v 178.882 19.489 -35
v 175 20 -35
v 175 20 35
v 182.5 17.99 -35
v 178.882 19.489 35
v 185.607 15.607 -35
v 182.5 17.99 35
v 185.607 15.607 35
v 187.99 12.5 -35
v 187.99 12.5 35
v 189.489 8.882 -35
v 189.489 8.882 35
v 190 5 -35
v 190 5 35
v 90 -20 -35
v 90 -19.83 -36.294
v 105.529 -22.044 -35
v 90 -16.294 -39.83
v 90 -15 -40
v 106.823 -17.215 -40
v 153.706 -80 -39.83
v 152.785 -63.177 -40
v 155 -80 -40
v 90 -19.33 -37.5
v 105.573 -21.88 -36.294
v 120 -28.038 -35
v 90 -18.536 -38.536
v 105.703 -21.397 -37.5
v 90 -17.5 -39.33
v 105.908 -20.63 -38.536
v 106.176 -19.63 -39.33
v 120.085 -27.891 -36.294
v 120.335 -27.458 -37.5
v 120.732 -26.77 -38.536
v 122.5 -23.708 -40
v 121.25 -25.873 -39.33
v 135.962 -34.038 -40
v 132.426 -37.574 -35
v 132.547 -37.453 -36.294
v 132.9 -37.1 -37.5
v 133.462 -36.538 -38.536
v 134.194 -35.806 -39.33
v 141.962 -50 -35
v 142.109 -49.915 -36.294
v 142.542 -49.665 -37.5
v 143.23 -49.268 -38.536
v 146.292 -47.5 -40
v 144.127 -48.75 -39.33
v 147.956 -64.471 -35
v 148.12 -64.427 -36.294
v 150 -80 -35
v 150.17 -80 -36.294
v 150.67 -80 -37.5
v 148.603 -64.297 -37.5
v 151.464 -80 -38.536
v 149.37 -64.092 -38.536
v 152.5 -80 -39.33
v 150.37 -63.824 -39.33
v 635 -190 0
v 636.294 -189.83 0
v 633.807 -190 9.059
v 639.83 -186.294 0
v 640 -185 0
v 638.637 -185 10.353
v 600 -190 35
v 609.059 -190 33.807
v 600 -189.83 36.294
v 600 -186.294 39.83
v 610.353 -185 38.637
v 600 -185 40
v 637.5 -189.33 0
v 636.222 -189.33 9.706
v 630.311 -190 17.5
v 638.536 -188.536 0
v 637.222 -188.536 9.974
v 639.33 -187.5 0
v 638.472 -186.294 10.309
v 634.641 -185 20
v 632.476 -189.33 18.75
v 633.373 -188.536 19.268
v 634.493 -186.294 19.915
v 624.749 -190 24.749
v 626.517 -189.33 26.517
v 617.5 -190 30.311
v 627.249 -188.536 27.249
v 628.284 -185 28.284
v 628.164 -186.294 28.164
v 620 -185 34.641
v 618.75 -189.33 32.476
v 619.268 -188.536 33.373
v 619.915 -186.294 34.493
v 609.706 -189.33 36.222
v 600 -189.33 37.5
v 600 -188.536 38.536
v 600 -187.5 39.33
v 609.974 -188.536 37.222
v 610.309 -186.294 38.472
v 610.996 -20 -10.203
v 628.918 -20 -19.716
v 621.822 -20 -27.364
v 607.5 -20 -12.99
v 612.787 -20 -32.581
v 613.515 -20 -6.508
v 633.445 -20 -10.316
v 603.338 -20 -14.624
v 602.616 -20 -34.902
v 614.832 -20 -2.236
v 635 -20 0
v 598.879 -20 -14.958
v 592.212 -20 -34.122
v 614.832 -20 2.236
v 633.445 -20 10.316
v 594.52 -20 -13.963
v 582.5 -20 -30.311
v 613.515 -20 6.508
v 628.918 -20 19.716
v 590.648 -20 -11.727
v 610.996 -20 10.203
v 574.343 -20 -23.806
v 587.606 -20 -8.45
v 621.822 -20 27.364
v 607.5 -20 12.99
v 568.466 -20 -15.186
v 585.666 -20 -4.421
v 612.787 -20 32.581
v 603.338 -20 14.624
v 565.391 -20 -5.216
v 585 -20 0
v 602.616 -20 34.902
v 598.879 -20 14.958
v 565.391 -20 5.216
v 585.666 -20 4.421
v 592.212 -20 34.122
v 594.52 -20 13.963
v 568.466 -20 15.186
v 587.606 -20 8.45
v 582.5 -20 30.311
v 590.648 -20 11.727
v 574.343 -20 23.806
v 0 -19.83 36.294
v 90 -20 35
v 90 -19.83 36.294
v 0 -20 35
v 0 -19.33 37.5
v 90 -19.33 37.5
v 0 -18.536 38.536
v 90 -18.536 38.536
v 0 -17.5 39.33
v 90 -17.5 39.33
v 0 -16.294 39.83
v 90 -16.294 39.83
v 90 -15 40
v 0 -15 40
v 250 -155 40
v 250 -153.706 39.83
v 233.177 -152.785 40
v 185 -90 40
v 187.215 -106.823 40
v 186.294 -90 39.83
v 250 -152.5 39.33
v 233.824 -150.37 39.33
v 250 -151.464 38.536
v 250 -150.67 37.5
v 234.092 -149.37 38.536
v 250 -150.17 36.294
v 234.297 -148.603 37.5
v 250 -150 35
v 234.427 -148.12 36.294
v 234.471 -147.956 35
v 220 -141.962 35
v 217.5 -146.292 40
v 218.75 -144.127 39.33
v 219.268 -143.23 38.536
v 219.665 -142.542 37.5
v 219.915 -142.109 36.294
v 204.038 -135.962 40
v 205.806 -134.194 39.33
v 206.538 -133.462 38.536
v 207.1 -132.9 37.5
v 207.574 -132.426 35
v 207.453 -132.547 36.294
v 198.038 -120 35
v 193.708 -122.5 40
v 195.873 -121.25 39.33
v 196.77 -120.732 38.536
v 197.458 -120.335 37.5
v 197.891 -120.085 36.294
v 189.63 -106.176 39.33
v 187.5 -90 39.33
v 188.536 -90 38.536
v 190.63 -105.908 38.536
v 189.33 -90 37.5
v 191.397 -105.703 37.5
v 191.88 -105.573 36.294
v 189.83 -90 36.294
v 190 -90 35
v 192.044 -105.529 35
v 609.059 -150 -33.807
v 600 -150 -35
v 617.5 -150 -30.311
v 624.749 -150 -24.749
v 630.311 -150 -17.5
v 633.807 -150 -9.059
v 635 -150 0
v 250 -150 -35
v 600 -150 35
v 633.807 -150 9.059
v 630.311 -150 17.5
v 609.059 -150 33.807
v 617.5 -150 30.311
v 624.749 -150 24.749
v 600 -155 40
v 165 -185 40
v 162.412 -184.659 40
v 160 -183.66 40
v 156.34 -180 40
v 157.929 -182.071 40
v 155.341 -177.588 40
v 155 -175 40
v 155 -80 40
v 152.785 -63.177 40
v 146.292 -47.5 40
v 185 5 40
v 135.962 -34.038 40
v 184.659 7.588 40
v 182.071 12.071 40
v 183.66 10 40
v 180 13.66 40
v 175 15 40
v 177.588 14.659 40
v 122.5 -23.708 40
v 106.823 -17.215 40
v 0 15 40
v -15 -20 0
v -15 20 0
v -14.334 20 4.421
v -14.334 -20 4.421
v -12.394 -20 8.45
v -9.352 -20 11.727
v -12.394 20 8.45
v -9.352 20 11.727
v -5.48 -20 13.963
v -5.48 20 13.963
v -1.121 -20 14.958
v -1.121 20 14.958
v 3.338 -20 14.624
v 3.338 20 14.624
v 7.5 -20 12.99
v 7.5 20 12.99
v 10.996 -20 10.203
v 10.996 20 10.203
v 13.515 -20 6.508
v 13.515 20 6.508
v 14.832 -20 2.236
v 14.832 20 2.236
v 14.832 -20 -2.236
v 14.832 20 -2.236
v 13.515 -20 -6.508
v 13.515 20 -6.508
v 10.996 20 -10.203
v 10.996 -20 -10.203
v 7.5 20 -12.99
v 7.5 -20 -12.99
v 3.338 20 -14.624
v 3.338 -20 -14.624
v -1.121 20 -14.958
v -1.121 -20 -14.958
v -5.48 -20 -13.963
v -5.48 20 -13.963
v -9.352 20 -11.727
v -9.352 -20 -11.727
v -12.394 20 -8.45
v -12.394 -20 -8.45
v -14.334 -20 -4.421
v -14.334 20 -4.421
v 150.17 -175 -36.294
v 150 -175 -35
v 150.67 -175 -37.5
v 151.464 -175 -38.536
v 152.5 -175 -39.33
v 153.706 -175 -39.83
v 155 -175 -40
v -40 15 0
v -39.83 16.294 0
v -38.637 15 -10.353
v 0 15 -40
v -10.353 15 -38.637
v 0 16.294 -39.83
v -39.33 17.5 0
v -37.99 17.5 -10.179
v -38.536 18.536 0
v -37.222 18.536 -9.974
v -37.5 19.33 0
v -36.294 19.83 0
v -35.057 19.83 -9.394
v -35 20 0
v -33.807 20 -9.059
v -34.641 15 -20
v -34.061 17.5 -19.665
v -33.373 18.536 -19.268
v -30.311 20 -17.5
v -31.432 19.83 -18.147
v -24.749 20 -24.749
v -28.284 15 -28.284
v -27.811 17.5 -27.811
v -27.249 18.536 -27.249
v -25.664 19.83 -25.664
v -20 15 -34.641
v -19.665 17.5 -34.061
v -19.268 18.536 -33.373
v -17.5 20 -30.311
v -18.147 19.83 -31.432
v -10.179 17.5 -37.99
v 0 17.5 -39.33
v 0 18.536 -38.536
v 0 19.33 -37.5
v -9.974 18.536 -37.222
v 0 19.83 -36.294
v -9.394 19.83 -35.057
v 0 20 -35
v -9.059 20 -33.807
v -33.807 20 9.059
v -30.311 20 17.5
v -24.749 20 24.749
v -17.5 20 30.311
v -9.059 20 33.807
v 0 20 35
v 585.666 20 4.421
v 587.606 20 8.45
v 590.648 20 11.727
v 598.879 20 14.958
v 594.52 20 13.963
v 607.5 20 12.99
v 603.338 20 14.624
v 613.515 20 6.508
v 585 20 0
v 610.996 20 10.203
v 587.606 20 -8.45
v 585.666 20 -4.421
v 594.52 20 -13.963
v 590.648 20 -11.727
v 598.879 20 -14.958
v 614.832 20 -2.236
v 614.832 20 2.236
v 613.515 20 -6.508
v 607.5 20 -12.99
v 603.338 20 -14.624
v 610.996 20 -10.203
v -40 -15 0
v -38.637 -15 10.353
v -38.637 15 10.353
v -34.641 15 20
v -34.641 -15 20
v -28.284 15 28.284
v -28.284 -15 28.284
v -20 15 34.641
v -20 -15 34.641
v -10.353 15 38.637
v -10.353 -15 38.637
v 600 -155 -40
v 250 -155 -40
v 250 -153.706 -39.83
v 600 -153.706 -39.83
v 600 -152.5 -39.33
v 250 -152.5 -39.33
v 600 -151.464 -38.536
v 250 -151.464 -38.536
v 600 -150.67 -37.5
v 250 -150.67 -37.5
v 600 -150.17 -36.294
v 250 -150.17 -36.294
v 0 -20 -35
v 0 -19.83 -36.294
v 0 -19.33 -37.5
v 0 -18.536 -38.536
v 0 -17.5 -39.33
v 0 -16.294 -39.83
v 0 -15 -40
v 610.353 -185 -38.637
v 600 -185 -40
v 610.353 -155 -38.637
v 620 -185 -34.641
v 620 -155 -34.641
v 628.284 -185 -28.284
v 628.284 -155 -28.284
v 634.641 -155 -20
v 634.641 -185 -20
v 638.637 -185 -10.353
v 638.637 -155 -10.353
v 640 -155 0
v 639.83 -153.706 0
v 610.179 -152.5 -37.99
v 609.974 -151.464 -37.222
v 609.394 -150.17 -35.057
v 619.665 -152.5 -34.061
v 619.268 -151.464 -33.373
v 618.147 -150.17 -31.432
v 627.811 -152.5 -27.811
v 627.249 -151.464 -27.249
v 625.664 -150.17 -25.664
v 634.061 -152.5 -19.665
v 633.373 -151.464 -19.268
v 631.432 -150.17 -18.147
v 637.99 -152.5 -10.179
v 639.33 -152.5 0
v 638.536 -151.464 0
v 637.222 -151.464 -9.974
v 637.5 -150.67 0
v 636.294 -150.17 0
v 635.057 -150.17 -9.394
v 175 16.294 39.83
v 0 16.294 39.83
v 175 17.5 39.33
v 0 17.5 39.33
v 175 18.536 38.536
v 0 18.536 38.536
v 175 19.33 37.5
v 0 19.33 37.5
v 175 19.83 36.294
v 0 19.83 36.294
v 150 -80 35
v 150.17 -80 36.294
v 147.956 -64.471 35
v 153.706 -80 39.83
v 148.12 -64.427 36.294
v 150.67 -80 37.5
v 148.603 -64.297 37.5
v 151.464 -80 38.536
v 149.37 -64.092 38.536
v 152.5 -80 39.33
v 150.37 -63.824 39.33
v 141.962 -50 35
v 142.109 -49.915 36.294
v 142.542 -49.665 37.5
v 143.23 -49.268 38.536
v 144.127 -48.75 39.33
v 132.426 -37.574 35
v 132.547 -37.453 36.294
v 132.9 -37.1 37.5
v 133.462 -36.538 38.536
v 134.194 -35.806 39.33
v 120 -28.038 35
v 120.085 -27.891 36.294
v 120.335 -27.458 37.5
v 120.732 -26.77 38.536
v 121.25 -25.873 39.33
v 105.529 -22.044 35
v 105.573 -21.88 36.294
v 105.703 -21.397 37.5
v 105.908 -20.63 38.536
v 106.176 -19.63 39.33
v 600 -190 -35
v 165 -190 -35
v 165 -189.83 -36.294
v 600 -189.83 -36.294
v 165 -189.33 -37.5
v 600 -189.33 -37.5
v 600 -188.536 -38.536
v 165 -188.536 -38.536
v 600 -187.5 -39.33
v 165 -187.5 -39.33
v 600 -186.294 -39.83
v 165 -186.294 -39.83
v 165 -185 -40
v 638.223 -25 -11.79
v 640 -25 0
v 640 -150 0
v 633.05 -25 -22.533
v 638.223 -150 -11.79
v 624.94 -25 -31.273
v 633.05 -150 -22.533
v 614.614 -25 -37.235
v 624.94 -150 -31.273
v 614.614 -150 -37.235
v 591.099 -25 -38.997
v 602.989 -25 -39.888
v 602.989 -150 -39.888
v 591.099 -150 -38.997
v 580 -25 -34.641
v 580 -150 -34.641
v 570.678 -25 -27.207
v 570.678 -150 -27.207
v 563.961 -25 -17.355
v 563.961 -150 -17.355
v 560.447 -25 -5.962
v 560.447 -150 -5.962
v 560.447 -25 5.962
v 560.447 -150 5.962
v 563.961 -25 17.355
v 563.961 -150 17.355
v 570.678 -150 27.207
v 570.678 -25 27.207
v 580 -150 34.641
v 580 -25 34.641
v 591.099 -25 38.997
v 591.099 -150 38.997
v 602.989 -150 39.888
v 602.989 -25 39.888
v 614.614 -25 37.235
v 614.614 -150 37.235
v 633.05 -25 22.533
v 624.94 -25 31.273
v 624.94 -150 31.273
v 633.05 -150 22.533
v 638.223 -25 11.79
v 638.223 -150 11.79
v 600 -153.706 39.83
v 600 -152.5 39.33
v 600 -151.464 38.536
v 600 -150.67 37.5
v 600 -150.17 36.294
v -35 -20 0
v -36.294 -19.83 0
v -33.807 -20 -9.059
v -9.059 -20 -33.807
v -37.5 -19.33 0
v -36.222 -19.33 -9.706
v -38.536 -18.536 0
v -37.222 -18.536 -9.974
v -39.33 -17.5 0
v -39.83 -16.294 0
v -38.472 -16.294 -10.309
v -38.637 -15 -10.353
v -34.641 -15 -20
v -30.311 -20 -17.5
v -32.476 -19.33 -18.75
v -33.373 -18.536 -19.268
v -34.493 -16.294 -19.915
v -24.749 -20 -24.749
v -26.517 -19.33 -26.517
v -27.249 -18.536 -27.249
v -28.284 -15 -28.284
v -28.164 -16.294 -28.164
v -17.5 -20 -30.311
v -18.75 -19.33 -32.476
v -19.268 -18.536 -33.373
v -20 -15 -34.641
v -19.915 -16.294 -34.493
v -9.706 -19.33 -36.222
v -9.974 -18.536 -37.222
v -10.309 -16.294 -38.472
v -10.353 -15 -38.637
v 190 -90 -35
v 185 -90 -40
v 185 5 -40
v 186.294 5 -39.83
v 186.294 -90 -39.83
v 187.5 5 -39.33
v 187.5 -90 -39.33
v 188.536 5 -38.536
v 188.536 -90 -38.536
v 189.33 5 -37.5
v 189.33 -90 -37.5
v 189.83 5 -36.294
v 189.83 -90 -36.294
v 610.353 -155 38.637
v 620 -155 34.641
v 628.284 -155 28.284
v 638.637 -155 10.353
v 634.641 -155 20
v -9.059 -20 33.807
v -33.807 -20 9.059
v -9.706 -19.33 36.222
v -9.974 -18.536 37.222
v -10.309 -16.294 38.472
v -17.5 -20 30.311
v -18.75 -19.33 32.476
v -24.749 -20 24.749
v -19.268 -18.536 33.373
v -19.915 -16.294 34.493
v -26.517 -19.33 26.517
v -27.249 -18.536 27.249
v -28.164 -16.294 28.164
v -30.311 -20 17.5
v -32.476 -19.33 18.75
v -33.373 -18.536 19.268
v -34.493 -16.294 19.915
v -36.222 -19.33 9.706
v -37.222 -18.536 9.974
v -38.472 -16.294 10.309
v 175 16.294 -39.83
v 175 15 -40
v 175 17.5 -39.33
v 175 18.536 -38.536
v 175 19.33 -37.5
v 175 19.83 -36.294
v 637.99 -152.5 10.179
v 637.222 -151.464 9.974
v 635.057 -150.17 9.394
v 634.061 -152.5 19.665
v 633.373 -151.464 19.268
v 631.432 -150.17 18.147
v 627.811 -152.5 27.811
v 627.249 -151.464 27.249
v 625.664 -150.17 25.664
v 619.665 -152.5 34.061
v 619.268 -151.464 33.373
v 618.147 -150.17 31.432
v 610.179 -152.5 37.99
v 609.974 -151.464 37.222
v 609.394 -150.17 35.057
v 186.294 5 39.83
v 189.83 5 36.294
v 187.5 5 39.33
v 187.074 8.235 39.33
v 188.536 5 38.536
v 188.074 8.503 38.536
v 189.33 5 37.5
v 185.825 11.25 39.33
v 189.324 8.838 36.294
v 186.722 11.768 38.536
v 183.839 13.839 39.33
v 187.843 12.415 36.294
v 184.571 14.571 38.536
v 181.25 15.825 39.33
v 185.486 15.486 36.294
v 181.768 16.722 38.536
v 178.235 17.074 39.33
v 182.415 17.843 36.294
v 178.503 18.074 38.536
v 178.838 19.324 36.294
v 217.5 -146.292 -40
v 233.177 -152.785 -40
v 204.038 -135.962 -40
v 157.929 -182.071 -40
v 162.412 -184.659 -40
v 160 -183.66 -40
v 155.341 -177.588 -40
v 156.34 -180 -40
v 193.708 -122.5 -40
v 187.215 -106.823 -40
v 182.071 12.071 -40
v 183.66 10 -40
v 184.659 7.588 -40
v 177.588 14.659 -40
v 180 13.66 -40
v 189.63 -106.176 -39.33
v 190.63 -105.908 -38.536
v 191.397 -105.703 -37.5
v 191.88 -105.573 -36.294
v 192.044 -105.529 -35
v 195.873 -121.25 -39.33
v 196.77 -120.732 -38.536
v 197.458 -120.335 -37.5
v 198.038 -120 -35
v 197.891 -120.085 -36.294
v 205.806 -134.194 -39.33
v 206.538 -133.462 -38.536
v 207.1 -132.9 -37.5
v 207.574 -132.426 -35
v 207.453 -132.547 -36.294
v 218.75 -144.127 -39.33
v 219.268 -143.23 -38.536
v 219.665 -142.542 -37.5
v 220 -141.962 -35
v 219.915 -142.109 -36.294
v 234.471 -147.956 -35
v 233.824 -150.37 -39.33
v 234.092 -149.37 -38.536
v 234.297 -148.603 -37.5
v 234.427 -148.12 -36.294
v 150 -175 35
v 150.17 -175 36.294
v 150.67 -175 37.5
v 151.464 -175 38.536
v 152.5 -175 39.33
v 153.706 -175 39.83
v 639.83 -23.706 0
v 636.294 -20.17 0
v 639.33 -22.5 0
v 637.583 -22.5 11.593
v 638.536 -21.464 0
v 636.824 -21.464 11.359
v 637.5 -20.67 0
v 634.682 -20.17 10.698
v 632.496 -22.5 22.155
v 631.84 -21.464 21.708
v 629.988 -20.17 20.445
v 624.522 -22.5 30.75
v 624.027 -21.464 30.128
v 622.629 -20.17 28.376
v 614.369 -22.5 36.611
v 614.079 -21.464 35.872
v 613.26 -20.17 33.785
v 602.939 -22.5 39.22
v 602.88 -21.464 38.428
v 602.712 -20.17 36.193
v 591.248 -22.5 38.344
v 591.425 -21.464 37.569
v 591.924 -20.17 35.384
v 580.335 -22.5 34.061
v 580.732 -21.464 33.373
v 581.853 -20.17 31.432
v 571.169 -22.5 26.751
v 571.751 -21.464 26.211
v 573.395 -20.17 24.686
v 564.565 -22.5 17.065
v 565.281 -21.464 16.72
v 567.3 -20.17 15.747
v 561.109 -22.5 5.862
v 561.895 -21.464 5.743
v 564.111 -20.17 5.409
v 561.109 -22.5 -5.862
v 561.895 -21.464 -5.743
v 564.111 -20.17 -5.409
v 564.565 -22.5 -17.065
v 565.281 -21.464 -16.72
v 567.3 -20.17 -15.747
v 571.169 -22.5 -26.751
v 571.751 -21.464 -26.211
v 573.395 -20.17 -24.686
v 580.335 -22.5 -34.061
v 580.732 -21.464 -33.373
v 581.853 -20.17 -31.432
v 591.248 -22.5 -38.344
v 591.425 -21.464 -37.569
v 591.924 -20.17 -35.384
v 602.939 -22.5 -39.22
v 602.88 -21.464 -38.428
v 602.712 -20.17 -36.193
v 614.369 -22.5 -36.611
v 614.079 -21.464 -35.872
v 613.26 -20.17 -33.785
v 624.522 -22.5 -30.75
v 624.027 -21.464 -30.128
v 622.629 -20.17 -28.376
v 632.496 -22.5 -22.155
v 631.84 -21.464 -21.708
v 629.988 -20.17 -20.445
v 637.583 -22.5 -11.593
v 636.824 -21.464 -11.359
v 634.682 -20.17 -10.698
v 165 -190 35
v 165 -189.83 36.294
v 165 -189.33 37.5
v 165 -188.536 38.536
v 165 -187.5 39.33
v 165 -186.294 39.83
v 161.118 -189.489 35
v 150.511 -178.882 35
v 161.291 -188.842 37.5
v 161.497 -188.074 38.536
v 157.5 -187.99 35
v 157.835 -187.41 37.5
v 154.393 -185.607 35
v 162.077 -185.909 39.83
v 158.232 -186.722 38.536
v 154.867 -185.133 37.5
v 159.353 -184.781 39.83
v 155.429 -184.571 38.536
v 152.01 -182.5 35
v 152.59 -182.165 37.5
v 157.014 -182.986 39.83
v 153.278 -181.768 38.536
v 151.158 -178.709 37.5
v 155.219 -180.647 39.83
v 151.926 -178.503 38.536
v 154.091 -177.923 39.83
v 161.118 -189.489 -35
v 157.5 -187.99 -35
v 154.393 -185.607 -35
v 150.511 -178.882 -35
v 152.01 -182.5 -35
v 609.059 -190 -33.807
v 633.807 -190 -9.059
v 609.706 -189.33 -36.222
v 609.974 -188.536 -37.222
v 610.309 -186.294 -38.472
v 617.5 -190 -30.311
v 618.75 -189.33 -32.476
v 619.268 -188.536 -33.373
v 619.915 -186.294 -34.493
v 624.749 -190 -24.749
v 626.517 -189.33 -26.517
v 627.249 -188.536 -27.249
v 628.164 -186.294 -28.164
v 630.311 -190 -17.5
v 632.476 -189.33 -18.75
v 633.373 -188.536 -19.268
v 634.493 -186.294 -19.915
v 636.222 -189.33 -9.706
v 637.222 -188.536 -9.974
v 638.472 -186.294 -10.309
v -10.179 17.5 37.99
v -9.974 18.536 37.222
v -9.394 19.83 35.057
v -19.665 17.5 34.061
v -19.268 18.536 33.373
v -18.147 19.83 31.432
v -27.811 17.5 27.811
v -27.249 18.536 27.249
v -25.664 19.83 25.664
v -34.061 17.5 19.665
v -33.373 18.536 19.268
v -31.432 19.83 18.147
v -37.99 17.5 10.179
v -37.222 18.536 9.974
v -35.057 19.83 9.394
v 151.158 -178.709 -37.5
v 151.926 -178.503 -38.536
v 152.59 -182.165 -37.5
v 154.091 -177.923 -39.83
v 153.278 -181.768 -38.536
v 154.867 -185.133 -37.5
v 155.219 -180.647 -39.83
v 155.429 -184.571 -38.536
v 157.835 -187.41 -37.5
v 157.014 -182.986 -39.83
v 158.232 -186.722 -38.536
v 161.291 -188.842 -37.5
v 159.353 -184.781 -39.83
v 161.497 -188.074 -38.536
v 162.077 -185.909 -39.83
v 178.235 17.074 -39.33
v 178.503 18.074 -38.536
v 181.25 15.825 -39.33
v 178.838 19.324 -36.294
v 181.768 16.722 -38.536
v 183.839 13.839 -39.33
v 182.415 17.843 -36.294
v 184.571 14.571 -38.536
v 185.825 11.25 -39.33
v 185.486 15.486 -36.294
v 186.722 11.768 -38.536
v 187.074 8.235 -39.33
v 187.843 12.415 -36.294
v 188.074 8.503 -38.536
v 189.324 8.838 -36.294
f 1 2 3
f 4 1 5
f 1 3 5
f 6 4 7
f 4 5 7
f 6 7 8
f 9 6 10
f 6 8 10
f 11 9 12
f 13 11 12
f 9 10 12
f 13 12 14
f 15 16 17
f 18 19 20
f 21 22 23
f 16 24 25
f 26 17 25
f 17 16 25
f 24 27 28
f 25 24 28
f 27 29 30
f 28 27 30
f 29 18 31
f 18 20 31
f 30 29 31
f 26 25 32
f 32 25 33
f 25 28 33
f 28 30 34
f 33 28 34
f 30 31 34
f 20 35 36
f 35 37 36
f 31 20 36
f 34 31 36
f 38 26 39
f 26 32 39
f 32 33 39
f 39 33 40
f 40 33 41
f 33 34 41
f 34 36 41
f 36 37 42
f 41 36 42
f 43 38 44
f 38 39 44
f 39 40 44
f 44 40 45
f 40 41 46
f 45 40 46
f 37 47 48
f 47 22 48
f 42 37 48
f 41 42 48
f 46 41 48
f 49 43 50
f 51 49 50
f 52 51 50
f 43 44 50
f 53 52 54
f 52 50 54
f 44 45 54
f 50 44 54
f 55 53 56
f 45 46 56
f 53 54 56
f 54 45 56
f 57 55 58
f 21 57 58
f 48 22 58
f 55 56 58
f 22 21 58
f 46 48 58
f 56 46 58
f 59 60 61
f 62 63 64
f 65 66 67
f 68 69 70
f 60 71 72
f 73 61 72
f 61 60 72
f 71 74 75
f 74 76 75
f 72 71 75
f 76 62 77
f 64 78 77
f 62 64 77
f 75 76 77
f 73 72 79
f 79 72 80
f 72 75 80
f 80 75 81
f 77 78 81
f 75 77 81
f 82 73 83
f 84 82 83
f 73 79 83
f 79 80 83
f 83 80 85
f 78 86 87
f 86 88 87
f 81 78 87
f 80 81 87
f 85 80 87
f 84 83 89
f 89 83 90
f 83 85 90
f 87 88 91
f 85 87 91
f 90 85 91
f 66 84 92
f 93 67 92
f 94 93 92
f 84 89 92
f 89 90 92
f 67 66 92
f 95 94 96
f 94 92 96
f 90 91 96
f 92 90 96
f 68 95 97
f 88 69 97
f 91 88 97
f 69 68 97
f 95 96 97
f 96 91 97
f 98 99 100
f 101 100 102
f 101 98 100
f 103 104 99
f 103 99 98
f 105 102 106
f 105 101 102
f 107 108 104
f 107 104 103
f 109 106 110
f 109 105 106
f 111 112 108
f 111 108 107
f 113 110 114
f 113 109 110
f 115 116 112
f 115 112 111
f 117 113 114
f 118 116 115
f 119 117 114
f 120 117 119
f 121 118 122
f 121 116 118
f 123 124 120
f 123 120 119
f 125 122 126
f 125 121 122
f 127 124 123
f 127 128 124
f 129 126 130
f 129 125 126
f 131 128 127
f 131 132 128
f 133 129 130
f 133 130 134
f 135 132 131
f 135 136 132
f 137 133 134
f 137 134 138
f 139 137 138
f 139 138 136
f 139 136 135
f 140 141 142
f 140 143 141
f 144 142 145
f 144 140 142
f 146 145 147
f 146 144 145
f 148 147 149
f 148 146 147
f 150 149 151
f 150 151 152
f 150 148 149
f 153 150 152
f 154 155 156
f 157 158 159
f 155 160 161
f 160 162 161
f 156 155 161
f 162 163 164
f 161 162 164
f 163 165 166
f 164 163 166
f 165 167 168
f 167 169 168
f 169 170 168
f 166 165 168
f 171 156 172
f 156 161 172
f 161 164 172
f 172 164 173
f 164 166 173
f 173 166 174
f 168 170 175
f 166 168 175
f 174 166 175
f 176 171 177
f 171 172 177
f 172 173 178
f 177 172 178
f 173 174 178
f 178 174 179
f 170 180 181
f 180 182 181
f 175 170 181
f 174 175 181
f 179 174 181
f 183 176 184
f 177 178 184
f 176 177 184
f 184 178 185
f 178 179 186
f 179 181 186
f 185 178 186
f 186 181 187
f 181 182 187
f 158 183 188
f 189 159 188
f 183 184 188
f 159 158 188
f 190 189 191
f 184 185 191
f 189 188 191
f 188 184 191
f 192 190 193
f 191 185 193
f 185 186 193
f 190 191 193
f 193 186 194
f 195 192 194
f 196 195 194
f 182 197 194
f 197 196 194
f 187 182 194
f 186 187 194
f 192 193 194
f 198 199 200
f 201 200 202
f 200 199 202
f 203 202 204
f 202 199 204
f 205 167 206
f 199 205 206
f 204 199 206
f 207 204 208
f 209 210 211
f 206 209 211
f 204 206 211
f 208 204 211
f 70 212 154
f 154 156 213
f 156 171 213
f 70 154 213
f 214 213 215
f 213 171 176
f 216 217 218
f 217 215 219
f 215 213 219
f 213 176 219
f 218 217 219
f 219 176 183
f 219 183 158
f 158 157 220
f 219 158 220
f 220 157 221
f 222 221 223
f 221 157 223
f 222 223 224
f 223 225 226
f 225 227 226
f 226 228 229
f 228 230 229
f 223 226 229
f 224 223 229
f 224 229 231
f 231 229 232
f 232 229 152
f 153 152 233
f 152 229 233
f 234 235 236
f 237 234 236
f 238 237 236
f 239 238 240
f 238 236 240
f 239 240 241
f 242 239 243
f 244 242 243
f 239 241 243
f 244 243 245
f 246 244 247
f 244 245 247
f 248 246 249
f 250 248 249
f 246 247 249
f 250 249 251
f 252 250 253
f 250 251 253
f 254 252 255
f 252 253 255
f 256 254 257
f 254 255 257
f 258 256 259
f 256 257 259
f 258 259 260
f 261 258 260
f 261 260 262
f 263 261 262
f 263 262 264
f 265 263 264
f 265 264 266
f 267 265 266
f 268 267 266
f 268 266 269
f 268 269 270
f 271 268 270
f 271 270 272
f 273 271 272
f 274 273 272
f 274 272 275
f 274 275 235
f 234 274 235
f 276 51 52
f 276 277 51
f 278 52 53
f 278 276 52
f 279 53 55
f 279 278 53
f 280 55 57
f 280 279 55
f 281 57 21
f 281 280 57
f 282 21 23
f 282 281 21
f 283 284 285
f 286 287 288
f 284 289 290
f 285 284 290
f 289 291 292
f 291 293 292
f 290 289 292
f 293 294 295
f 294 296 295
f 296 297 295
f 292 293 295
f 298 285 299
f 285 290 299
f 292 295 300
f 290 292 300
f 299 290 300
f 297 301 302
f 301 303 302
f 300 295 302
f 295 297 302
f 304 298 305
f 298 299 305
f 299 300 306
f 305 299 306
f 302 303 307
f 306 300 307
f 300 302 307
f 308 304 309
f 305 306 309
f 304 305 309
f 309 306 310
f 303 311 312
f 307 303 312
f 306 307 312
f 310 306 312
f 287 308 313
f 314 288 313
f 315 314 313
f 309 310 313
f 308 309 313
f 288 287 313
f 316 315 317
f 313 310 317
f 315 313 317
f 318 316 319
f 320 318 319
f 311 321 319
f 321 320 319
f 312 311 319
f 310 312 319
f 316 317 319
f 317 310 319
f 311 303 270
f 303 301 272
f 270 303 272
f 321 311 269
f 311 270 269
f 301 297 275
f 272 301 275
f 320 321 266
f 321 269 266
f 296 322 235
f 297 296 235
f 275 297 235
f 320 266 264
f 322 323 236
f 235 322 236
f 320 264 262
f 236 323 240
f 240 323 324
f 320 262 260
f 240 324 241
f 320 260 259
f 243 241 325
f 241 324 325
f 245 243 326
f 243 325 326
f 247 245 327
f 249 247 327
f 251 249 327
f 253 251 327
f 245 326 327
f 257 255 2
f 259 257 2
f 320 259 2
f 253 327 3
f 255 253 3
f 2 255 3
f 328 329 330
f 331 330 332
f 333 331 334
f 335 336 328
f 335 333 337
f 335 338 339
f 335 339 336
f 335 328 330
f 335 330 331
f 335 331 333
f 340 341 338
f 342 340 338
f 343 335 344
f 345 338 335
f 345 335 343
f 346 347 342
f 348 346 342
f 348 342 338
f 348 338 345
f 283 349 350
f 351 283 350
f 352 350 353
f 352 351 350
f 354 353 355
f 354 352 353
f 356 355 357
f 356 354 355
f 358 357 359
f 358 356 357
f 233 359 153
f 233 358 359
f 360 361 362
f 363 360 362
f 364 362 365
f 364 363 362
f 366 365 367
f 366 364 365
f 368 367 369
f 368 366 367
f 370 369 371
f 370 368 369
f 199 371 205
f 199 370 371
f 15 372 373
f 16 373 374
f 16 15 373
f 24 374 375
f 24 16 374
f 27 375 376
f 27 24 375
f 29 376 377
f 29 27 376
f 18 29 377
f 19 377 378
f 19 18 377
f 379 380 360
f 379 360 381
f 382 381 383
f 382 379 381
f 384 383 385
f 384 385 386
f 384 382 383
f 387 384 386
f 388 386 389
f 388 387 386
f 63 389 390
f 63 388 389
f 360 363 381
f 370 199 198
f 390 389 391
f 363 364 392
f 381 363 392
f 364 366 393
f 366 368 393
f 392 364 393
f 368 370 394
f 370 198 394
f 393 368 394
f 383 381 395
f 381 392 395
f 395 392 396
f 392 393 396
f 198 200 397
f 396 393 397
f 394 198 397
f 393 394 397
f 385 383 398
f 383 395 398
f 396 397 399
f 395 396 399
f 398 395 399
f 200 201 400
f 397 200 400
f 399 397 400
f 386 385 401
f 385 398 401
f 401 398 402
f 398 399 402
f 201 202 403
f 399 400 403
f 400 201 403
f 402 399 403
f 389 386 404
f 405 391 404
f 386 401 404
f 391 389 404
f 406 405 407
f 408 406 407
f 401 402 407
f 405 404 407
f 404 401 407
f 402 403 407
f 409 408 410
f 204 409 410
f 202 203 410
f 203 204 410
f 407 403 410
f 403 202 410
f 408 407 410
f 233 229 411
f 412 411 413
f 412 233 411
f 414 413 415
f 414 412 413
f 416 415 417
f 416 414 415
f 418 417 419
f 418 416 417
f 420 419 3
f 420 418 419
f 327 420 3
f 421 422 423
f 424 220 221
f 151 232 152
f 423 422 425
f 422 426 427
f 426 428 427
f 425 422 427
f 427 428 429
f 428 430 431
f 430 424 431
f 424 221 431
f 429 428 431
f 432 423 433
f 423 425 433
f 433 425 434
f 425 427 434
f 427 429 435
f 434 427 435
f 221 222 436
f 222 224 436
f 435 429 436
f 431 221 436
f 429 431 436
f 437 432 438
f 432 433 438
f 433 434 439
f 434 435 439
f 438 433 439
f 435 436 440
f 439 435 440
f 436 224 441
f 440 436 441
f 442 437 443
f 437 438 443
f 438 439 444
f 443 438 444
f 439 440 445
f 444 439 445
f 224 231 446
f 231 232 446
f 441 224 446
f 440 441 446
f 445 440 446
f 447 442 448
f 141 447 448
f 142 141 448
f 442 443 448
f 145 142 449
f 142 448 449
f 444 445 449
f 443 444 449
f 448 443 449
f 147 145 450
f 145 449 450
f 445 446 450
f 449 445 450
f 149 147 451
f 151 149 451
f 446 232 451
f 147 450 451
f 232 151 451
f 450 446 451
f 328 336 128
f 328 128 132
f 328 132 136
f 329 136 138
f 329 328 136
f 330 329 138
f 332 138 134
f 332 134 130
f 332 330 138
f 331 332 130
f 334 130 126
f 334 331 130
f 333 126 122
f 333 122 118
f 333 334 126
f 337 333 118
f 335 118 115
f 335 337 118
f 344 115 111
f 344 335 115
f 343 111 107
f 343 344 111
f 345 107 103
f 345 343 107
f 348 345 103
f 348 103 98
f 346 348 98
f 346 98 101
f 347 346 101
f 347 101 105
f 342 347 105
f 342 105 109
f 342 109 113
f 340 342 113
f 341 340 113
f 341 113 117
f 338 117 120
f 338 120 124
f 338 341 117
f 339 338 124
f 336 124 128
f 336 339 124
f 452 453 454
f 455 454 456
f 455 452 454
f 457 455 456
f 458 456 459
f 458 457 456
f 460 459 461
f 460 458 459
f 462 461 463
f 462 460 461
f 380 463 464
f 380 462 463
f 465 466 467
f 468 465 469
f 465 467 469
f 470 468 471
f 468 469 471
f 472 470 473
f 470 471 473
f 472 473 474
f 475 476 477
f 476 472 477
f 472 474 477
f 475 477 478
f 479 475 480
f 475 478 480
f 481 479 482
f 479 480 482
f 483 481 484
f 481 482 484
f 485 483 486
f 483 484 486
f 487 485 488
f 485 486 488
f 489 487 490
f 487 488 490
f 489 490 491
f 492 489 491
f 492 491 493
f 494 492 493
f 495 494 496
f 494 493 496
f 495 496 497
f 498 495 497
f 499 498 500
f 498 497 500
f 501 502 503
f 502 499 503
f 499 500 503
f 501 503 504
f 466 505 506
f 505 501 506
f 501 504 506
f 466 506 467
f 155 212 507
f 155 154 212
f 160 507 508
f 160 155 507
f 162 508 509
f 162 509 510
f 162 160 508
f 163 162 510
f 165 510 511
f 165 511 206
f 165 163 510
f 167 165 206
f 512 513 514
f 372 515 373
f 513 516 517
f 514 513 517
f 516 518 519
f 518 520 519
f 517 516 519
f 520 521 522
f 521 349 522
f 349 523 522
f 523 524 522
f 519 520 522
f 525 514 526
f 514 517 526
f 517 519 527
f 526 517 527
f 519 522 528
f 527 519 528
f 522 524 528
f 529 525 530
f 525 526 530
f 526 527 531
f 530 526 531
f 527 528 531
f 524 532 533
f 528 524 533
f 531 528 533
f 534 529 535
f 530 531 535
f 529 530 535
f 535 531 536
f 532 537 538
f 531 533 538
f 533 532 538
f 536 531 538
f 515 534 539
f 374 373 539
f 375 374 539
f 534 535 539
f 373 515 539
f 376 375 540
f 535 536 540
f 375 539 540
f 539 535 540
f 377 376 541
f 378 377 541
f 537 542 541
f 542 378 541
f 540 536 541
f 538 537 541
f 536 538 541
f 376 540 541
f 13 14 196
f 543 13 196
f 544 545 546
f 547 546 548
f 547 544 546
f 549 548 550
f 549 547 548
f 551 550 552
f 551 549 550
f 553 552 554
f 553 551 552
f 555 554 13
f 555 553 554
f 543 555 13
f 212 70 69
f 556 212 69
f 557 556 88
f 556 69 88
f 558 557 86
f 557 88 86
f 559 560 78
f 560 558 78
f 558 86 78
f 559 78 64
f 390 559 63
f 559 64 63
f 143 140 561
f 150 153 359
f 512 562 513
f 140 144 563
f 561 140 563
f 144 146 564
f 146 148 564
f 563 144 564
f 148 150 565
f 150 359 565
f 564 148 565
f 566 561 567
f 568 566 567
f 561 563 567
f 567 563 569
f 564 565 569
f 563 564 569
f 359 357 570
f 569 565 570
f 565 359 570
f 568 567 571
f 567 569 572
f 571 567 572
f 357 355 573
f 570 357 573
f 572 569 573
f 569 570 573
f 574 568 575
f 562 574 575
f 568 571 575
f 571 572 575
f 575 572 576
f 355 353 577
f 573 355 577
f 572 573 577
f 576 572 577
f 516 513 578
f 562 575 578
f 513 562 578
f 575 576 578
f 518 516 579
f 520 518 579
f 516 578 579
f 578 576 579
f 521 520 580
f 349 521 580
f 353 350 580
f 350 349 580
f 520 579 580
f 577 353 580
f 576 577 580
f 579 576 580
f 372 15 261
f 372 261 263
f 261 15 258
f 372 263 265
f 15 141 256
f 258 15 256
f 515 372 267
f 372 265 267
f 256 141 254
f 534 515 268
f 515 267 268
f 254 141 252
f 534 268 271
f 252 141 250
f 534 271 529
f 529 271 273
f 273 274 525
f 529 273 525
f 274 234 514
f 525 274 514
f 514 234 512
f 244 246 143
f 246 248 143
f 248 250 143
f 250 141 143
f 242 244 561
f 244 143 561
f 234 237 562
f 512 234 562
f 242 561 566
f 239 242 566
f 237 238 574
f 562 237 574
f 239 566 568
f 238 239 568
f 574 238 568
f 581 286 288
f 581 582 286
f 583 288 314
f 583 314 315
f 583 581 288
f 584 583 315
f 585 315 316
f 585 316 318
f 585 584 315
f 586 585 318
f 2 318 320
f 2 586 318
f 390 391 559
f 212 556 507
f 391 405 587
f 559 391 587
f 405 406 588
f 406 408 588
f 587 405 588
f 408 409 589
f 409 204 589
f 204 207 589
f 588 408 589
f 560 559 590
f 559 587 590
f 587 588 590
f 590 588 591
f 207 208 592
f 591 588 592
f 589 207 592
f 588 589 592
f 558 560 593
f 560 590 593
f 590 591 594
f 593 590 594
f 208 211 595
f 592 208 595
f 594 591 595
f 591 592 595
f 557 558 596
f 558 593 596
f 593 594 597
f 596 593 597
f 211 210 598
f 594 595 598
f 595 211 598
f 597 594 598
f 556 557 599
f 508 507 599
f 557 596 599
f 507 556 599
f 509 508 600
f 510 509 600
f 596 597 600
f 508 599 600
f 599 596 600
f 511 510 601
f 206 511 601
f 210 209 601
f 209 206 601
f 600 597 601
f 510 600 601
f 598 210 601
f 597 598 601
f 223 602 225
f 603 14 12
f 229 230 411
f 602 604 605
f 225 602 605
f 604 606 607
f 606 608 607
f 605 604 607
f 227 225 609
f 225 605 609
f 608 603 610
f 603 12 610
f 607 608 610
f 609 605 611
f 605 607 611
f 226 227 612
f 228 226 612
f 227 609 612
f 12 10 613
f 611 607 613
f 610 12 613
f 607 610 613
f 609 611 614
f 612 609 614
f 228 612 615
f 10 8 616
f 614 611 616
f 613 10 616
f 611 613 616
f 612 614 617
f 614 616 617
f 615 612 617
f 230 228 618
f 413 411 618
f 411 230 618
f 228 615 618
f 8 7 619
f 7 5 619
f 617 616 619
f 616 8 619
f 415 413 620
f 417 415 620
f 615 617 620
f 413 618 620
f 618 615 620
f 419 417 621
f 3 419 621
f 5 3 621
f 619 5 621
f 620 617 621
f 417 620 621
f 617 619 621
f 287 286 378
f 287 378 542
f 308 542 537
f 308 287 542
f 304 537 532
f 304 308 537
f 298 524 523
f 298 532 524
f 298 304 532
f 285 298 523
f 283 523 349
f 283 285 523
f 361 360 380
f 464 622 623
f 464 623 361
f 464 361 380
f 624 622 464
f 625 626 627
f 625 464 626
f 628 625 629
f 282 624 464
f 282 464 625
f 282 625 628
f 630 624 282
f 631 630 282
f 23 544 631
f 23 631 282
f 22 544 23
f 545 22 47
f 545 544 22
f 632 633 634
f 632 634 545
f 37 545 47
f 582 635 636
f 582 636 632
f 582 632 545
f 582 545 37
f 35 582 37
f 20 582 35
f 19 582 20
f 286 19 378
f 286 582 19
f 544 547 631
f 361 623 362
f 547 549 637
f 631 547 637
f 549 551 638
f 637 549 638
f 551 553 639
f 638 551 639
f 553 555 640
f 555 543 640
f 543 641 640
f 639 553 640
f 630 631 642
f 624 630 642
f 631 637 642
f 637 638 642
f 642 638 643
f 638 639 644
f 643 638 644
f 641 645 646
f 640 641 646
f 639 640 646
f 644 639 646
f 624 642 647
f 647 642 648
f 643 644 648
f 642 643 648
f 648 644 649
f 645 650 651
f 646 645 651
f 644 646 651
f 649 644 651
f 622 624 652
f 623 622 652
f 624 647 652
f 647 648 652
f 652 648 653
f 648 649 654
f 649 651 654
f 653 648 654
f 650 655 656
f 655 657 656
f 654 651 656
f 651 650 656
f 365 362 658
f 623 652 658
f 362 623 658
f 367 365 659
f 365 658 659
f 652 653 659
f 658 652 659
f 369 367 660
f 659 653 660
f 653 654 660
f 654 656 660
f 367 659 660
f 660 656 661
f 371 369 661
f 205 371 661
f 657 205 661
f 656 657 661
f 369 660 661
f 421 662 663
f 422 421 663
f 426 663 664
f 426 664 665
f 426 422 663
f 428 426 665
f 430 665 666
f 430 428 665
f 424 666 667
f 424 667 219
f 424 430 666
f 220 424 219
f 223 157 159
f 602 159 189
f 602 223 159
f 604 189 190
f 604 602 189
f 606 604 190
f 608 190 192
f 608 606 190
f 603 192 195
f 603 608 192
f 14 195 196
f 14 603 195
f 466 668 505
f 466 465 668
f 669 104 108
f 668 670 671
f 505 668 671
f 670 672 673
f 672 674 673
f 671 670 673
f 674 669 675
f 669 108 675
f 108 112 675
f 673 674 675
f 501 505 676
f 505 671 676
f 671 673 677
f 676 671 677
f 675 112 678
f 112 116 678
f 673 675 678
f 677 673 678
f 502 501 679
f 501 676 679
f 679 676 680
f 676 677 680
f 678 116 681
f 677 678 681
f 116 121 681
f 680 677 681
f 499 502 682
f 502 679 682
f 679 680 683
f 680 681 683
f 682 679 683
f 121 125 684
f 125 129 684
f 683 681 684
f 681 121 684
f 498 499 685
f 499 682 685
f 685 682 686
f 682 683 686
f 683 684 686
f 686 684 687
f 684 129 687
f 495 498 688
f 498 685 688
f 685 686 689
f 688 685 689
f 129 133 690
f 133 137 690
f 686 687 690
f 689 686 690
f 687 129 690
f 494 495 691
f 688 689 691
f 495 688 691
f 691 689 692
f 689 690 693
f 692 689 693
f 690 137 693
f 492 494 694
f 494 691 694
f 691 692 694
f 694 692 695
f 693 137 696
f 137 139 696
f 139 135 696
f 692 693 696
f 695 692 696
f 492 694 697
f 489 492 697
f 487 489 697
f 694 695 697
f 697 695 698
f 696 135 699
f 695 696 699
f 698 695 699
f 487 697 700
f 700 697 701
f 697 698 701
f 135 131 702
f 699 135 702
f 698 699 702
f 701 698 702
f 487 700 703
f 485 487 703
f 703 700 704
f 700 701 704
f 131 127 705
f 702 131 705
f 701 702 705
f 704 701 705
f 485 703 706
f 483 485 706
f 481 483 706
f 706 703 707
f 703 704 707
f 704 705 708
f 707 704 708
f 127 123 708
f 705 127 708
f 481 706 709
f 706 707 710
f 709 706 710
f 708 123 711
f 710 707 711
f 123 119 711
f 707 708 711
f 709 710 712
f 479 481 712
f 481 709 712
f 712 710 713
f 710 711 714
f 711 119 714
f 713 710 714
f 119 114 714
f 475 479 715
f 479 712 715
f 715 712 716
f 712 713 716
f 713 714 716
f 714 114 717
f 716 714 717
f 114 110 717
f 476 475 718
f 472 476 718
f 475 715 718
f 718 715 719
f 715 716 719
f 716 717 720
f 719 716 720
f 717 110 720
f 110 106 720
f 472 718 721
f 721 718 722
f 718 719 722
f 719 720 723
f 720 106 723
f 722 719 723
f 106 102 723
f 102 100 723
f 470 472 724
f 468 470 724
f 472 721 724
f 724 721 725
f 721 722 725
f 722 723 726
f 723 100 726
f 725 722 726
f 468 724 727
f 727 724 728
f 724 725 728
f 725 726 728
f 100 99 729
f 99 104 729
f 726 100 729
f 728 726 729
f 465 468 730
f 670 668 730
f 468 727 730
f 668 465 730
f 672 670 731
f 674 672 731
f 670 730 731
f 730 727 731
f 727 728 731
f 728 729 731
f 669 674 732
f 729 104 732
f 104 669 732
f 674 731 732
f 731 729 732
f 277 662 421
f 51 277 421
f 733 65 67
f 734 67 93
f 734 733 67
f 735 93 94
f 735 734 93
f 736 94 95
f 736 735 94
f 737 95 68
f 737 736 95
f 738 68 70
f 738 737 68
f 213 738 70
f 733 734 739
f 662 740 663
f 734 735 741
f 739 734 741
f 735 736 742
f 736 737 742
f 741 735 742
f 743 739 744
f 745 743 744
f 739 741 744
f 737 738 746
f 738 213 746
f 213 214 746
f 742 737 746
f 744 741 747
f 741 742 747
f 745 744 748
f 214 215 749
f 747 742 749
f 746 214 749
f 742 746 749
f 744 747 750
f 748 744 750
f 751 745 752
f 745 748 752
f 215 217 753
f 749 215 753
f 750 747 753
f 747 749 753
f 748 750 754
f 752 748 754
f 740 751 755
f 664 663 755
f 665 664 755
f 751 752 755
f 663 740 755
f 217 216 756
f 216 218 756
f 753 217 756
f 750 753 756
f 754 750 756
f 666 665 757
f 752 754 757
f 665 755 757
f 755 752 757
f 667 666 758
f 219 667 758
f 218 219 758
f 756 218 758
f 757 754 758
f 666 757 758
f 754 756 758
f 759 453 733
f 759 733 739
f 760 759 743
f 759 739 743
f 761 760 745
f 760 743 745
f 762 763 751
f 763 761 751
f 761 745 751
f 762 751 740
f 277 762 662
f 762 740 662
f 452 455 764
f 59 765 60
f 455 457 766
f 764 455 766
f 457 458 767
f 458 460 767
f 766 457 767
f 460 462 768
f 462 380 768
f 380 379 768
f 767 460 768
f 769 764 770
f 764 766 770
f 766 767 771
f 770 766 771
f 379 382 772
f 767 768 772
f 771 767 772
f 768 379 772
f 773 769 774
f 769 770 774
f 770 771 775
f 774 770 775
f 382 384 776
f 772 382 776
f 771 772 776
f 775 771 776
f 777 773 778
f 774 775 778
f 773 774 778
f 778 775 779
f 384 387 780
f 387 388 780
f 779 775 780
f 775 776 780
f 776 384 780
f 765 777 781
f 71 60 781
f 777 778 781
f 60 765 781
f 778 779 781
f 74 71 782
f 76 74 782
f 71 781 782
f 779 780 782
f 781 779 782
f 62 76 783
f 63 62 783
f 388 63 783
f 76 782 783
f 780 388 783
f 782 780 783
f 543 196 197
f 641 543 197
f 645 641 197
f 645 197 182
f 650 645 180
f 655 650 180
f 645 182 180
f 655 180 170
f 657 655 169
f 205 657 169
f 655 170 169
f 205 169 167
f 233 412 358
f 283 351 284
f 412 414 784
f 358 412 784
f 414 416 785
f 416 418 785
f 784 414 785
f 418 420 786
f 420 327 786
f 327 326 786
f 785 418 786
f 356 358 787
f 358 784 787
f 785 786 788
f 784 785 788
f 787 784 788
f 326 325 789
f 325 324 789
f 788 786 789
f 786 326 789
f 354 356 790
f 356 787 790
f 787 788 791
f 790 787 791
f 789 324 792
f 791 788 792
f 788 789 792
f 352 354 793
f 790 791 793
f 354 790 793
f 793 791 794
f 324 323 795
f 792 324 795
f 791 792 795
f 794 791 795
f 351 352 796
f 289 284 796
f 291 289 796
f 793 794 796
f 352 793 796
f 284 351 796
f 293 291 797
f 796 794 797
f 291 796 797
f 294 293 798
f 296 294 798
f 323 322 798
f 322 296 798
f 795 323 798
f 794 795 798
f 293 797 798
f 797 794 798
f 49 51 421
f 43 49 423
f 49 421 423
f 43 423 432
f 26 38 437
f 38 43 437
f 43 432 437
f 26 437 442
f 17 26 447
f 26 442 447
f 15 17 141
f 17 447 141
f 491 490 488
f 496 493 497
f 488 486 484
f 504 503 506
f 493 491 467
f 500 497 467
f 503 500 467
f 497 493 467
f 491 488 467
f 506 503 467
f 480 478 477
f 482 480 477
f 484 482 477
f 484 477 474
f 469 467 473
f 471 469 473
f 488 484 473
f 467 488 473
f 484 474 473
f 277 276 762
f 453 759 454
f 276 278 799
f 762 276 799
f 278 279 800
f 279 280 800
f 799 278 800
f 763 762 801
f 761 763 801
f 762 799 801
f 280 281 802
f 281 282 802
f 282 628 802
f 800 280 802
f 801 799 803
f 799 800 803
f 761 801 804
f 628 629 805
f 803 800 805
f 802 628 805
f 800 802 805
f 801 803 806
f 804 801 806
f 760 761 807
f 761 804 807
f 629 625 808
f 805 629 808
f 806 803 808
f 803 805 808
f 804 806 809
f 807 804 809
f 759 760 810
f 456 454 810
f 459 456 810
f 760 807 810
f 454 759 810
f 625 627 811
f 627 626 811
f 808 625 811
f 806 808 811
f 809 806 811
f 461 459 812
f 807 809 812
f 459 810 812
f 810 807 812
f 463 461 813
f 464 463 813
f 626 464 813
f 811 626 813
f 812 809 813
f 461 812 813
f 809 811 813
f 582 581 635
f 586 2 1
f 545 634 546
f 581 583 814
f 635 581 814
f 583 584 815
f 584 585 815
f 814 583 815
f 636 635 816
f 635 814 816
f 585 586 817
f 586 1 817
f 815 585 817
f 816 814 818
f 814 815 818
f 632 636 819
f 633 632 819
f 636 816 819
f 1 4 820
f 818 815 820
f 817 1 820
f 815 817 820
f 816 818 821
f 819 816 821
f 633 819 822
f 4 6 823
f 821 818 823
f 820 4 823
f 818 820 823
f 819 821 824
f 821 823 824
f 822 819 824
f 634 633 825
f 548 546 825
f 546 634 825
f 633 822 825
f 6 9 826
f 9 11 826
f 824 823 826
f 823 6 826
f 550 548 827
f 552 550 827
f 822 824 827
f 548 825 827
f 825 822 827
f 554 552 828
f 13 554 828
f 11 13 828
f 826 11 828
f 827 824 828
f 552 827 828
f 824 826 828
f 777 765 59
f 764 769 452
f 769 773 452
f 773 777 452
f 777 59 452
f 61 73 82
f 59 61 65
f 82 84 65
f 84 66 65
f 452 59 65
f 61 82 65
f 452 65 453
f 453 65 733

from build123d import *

# Parameters (mm, degrees)
BOSS_EXTRUDE1_DEPTH = 40
SKETCH2_R           = 40
BOSS_EXTRUDE2_DEPTH = 170
SKETCH3_R           = 40
SKETCH3_R_2         = 15
CUT_EXTRUDE1_DEPTH  = 40
SKETCH4_R           = 15
CUT_EXTRUDE2_DEPTH  = 675.759216313
FILLET1_R           = 40
FILLET2_R           = 40
FILLET3_R           = 5
FILLET4_R           = 5


with BuildPart() as part:
    # Sketch1 → Boss-Extrude1 (new, symmetric)
    with BuildSketch(Plane.XY):
        with BuildLine():
            Line((0, -20), (-40, -20))
            Line((-40, -20), (-40, 20))
            Line((-40, 20), (0, 20))
            Line((0, 20), (175, 20))
            ThreePointArc((175, 20), (185.606601718, 15.606601718), (190, 5))
            Line((190, 5), (190, -90))
            ThreePointArc((190, -90), (207.573593129, -132.426406871), (250, -150))
            Line((250, -150), (640, -150))
            Line((640, -150), (640, -190))
            Line((640, -190), (165, -190))
            ThreePointArc((165, -190), (154.393398282, -185.606601718), (150, -175))
            Line((150, -175), (150, -80))
            ThreePointArc((150, -80), (132.426406871, -37.573593129), (90, -20))
            Line((90, -20), (0, -20))
        make_face()
    extrude(amount=BOSS_EXTRUDE1_DEPTH, both=True)

    # Sketch4 → Cut-Extrude2 (cut, through all)
    with BuildSketch(Plane(origin=(0, 20, 0), x_dir=(1, 0, 0), z_dir=(0, 1, 0))):
        with Locations(Location((0, 0, 0), (0, 0, 180))):
            Circle(SKETCH4_R)
    extrude(amount=-CUT_EXTRUDE2_DEPTH, mode=Mode.SUBTRACT)

    # Fillet1
    fillet1_edges = [part.edges().sort_by_distance(p)[0] for p in [
        (640, -170, 40),
        (640, -170, -40),
    ]]
    fillet(fillet1_edges, radius=FILLET1_R - 0.0001)  # a hair under: the kernel refuses the full size

    # Fillet2
    fillet2_edges = [part.edges().sort_by_distance(p)[0] for p in [
        (-40, 0, 40),
        (-40, 0, -40),
    ]]
    fillet(fillet2_edges, radius=FILLET2_R - 0.0001)  # a hair under: the kernel refuses the full size

    # Fillet4
    fillet4_edges = [part.edges().sort_by_distance(p)[0] for p in [
        (150, -127.5, 40),
        (87.49995, 20, -40),
        (185.606601718, 15.606601718, -40),
        (190, -42.5, -40),
        (207.573593129, -132.426406871, -40),
        (154.393398282, -185.606601718, 40),
        (382.50005, -190, -40),
        (154.393398282, -185.606601718, -40),
        (150, -127.5, -40),
        (132.426406871, -37.573593129, -40),
        (382.50005, -190, 40),
        (207.573593129, -132.426406871, 40),
        (190, -42.5, 40),
        (185.606601718, 15.606601718, 40),
        (87.49995, 20, 40),
        (425.00005, -150, 40),
        (425.00005, -150, -40),
        (628.284300537, -150, -28.284300537),
        (628.284300537, -150, 28.284300537),
        (628.284300537, -190, -28.284300537),
        (628.284300537, -190, 28.284300537),
        (44.99995, -20, 40),
        (44.99995, -20, -40),
        (-28.284300537, -20, -28.284300537),
        (-28.284300537, -20, 28.284300537),
        (-28.284300537, 20, -28.284300537),
        (-28.284300537, 20, 28.284300537),
        (132.426406871, -37.573593129, 40),
    ]]
    fillet(fillet4_edges, radius=FILLET4_R)


with BuildPart() as body_2:
    # Sketch2 → Boss-Extrude2 (new body)
    with BuildSketch(Plane(origin=(0, -150, 0), x_dir=(1, 0, 0), z_dir=(0, 1, 0))):
        with Locations((600, 0)):
            Circle(SKETCH2_R)
    extrude(amount=BOSS_EXTRUDE2_DEPTH)

    # Sketch3 → Cut-Extrude1 (cut)
    with BuildSketch(Plane(origin=(0, 20, 0), x_dir=(1, 0, 0), z_dir=(0, 1, 0))):
        with Locations(Location((600, 0, 0), (0, 0, 180))):
            Circle(SKETCH3_R)
        with Locations(Location((600, 0, 0), (0, 0, 180))):
            Circle(SKETCH3_R_2, mode=Mode.SUBTRACT)
    extrude(amount=-CUT_EXTRUDE1_DEPTH, mode=Mode.SUBTRACT)

    # Fillet3
    fillet3_edges = [body_2.edges().sort_by_distance(p)[0] for p in [
        (560, -20, 0),
    ]]
    fillet(fillet3_edges, radius=FILLET3_R)


solid = Compound([part.part, body_2.part])
